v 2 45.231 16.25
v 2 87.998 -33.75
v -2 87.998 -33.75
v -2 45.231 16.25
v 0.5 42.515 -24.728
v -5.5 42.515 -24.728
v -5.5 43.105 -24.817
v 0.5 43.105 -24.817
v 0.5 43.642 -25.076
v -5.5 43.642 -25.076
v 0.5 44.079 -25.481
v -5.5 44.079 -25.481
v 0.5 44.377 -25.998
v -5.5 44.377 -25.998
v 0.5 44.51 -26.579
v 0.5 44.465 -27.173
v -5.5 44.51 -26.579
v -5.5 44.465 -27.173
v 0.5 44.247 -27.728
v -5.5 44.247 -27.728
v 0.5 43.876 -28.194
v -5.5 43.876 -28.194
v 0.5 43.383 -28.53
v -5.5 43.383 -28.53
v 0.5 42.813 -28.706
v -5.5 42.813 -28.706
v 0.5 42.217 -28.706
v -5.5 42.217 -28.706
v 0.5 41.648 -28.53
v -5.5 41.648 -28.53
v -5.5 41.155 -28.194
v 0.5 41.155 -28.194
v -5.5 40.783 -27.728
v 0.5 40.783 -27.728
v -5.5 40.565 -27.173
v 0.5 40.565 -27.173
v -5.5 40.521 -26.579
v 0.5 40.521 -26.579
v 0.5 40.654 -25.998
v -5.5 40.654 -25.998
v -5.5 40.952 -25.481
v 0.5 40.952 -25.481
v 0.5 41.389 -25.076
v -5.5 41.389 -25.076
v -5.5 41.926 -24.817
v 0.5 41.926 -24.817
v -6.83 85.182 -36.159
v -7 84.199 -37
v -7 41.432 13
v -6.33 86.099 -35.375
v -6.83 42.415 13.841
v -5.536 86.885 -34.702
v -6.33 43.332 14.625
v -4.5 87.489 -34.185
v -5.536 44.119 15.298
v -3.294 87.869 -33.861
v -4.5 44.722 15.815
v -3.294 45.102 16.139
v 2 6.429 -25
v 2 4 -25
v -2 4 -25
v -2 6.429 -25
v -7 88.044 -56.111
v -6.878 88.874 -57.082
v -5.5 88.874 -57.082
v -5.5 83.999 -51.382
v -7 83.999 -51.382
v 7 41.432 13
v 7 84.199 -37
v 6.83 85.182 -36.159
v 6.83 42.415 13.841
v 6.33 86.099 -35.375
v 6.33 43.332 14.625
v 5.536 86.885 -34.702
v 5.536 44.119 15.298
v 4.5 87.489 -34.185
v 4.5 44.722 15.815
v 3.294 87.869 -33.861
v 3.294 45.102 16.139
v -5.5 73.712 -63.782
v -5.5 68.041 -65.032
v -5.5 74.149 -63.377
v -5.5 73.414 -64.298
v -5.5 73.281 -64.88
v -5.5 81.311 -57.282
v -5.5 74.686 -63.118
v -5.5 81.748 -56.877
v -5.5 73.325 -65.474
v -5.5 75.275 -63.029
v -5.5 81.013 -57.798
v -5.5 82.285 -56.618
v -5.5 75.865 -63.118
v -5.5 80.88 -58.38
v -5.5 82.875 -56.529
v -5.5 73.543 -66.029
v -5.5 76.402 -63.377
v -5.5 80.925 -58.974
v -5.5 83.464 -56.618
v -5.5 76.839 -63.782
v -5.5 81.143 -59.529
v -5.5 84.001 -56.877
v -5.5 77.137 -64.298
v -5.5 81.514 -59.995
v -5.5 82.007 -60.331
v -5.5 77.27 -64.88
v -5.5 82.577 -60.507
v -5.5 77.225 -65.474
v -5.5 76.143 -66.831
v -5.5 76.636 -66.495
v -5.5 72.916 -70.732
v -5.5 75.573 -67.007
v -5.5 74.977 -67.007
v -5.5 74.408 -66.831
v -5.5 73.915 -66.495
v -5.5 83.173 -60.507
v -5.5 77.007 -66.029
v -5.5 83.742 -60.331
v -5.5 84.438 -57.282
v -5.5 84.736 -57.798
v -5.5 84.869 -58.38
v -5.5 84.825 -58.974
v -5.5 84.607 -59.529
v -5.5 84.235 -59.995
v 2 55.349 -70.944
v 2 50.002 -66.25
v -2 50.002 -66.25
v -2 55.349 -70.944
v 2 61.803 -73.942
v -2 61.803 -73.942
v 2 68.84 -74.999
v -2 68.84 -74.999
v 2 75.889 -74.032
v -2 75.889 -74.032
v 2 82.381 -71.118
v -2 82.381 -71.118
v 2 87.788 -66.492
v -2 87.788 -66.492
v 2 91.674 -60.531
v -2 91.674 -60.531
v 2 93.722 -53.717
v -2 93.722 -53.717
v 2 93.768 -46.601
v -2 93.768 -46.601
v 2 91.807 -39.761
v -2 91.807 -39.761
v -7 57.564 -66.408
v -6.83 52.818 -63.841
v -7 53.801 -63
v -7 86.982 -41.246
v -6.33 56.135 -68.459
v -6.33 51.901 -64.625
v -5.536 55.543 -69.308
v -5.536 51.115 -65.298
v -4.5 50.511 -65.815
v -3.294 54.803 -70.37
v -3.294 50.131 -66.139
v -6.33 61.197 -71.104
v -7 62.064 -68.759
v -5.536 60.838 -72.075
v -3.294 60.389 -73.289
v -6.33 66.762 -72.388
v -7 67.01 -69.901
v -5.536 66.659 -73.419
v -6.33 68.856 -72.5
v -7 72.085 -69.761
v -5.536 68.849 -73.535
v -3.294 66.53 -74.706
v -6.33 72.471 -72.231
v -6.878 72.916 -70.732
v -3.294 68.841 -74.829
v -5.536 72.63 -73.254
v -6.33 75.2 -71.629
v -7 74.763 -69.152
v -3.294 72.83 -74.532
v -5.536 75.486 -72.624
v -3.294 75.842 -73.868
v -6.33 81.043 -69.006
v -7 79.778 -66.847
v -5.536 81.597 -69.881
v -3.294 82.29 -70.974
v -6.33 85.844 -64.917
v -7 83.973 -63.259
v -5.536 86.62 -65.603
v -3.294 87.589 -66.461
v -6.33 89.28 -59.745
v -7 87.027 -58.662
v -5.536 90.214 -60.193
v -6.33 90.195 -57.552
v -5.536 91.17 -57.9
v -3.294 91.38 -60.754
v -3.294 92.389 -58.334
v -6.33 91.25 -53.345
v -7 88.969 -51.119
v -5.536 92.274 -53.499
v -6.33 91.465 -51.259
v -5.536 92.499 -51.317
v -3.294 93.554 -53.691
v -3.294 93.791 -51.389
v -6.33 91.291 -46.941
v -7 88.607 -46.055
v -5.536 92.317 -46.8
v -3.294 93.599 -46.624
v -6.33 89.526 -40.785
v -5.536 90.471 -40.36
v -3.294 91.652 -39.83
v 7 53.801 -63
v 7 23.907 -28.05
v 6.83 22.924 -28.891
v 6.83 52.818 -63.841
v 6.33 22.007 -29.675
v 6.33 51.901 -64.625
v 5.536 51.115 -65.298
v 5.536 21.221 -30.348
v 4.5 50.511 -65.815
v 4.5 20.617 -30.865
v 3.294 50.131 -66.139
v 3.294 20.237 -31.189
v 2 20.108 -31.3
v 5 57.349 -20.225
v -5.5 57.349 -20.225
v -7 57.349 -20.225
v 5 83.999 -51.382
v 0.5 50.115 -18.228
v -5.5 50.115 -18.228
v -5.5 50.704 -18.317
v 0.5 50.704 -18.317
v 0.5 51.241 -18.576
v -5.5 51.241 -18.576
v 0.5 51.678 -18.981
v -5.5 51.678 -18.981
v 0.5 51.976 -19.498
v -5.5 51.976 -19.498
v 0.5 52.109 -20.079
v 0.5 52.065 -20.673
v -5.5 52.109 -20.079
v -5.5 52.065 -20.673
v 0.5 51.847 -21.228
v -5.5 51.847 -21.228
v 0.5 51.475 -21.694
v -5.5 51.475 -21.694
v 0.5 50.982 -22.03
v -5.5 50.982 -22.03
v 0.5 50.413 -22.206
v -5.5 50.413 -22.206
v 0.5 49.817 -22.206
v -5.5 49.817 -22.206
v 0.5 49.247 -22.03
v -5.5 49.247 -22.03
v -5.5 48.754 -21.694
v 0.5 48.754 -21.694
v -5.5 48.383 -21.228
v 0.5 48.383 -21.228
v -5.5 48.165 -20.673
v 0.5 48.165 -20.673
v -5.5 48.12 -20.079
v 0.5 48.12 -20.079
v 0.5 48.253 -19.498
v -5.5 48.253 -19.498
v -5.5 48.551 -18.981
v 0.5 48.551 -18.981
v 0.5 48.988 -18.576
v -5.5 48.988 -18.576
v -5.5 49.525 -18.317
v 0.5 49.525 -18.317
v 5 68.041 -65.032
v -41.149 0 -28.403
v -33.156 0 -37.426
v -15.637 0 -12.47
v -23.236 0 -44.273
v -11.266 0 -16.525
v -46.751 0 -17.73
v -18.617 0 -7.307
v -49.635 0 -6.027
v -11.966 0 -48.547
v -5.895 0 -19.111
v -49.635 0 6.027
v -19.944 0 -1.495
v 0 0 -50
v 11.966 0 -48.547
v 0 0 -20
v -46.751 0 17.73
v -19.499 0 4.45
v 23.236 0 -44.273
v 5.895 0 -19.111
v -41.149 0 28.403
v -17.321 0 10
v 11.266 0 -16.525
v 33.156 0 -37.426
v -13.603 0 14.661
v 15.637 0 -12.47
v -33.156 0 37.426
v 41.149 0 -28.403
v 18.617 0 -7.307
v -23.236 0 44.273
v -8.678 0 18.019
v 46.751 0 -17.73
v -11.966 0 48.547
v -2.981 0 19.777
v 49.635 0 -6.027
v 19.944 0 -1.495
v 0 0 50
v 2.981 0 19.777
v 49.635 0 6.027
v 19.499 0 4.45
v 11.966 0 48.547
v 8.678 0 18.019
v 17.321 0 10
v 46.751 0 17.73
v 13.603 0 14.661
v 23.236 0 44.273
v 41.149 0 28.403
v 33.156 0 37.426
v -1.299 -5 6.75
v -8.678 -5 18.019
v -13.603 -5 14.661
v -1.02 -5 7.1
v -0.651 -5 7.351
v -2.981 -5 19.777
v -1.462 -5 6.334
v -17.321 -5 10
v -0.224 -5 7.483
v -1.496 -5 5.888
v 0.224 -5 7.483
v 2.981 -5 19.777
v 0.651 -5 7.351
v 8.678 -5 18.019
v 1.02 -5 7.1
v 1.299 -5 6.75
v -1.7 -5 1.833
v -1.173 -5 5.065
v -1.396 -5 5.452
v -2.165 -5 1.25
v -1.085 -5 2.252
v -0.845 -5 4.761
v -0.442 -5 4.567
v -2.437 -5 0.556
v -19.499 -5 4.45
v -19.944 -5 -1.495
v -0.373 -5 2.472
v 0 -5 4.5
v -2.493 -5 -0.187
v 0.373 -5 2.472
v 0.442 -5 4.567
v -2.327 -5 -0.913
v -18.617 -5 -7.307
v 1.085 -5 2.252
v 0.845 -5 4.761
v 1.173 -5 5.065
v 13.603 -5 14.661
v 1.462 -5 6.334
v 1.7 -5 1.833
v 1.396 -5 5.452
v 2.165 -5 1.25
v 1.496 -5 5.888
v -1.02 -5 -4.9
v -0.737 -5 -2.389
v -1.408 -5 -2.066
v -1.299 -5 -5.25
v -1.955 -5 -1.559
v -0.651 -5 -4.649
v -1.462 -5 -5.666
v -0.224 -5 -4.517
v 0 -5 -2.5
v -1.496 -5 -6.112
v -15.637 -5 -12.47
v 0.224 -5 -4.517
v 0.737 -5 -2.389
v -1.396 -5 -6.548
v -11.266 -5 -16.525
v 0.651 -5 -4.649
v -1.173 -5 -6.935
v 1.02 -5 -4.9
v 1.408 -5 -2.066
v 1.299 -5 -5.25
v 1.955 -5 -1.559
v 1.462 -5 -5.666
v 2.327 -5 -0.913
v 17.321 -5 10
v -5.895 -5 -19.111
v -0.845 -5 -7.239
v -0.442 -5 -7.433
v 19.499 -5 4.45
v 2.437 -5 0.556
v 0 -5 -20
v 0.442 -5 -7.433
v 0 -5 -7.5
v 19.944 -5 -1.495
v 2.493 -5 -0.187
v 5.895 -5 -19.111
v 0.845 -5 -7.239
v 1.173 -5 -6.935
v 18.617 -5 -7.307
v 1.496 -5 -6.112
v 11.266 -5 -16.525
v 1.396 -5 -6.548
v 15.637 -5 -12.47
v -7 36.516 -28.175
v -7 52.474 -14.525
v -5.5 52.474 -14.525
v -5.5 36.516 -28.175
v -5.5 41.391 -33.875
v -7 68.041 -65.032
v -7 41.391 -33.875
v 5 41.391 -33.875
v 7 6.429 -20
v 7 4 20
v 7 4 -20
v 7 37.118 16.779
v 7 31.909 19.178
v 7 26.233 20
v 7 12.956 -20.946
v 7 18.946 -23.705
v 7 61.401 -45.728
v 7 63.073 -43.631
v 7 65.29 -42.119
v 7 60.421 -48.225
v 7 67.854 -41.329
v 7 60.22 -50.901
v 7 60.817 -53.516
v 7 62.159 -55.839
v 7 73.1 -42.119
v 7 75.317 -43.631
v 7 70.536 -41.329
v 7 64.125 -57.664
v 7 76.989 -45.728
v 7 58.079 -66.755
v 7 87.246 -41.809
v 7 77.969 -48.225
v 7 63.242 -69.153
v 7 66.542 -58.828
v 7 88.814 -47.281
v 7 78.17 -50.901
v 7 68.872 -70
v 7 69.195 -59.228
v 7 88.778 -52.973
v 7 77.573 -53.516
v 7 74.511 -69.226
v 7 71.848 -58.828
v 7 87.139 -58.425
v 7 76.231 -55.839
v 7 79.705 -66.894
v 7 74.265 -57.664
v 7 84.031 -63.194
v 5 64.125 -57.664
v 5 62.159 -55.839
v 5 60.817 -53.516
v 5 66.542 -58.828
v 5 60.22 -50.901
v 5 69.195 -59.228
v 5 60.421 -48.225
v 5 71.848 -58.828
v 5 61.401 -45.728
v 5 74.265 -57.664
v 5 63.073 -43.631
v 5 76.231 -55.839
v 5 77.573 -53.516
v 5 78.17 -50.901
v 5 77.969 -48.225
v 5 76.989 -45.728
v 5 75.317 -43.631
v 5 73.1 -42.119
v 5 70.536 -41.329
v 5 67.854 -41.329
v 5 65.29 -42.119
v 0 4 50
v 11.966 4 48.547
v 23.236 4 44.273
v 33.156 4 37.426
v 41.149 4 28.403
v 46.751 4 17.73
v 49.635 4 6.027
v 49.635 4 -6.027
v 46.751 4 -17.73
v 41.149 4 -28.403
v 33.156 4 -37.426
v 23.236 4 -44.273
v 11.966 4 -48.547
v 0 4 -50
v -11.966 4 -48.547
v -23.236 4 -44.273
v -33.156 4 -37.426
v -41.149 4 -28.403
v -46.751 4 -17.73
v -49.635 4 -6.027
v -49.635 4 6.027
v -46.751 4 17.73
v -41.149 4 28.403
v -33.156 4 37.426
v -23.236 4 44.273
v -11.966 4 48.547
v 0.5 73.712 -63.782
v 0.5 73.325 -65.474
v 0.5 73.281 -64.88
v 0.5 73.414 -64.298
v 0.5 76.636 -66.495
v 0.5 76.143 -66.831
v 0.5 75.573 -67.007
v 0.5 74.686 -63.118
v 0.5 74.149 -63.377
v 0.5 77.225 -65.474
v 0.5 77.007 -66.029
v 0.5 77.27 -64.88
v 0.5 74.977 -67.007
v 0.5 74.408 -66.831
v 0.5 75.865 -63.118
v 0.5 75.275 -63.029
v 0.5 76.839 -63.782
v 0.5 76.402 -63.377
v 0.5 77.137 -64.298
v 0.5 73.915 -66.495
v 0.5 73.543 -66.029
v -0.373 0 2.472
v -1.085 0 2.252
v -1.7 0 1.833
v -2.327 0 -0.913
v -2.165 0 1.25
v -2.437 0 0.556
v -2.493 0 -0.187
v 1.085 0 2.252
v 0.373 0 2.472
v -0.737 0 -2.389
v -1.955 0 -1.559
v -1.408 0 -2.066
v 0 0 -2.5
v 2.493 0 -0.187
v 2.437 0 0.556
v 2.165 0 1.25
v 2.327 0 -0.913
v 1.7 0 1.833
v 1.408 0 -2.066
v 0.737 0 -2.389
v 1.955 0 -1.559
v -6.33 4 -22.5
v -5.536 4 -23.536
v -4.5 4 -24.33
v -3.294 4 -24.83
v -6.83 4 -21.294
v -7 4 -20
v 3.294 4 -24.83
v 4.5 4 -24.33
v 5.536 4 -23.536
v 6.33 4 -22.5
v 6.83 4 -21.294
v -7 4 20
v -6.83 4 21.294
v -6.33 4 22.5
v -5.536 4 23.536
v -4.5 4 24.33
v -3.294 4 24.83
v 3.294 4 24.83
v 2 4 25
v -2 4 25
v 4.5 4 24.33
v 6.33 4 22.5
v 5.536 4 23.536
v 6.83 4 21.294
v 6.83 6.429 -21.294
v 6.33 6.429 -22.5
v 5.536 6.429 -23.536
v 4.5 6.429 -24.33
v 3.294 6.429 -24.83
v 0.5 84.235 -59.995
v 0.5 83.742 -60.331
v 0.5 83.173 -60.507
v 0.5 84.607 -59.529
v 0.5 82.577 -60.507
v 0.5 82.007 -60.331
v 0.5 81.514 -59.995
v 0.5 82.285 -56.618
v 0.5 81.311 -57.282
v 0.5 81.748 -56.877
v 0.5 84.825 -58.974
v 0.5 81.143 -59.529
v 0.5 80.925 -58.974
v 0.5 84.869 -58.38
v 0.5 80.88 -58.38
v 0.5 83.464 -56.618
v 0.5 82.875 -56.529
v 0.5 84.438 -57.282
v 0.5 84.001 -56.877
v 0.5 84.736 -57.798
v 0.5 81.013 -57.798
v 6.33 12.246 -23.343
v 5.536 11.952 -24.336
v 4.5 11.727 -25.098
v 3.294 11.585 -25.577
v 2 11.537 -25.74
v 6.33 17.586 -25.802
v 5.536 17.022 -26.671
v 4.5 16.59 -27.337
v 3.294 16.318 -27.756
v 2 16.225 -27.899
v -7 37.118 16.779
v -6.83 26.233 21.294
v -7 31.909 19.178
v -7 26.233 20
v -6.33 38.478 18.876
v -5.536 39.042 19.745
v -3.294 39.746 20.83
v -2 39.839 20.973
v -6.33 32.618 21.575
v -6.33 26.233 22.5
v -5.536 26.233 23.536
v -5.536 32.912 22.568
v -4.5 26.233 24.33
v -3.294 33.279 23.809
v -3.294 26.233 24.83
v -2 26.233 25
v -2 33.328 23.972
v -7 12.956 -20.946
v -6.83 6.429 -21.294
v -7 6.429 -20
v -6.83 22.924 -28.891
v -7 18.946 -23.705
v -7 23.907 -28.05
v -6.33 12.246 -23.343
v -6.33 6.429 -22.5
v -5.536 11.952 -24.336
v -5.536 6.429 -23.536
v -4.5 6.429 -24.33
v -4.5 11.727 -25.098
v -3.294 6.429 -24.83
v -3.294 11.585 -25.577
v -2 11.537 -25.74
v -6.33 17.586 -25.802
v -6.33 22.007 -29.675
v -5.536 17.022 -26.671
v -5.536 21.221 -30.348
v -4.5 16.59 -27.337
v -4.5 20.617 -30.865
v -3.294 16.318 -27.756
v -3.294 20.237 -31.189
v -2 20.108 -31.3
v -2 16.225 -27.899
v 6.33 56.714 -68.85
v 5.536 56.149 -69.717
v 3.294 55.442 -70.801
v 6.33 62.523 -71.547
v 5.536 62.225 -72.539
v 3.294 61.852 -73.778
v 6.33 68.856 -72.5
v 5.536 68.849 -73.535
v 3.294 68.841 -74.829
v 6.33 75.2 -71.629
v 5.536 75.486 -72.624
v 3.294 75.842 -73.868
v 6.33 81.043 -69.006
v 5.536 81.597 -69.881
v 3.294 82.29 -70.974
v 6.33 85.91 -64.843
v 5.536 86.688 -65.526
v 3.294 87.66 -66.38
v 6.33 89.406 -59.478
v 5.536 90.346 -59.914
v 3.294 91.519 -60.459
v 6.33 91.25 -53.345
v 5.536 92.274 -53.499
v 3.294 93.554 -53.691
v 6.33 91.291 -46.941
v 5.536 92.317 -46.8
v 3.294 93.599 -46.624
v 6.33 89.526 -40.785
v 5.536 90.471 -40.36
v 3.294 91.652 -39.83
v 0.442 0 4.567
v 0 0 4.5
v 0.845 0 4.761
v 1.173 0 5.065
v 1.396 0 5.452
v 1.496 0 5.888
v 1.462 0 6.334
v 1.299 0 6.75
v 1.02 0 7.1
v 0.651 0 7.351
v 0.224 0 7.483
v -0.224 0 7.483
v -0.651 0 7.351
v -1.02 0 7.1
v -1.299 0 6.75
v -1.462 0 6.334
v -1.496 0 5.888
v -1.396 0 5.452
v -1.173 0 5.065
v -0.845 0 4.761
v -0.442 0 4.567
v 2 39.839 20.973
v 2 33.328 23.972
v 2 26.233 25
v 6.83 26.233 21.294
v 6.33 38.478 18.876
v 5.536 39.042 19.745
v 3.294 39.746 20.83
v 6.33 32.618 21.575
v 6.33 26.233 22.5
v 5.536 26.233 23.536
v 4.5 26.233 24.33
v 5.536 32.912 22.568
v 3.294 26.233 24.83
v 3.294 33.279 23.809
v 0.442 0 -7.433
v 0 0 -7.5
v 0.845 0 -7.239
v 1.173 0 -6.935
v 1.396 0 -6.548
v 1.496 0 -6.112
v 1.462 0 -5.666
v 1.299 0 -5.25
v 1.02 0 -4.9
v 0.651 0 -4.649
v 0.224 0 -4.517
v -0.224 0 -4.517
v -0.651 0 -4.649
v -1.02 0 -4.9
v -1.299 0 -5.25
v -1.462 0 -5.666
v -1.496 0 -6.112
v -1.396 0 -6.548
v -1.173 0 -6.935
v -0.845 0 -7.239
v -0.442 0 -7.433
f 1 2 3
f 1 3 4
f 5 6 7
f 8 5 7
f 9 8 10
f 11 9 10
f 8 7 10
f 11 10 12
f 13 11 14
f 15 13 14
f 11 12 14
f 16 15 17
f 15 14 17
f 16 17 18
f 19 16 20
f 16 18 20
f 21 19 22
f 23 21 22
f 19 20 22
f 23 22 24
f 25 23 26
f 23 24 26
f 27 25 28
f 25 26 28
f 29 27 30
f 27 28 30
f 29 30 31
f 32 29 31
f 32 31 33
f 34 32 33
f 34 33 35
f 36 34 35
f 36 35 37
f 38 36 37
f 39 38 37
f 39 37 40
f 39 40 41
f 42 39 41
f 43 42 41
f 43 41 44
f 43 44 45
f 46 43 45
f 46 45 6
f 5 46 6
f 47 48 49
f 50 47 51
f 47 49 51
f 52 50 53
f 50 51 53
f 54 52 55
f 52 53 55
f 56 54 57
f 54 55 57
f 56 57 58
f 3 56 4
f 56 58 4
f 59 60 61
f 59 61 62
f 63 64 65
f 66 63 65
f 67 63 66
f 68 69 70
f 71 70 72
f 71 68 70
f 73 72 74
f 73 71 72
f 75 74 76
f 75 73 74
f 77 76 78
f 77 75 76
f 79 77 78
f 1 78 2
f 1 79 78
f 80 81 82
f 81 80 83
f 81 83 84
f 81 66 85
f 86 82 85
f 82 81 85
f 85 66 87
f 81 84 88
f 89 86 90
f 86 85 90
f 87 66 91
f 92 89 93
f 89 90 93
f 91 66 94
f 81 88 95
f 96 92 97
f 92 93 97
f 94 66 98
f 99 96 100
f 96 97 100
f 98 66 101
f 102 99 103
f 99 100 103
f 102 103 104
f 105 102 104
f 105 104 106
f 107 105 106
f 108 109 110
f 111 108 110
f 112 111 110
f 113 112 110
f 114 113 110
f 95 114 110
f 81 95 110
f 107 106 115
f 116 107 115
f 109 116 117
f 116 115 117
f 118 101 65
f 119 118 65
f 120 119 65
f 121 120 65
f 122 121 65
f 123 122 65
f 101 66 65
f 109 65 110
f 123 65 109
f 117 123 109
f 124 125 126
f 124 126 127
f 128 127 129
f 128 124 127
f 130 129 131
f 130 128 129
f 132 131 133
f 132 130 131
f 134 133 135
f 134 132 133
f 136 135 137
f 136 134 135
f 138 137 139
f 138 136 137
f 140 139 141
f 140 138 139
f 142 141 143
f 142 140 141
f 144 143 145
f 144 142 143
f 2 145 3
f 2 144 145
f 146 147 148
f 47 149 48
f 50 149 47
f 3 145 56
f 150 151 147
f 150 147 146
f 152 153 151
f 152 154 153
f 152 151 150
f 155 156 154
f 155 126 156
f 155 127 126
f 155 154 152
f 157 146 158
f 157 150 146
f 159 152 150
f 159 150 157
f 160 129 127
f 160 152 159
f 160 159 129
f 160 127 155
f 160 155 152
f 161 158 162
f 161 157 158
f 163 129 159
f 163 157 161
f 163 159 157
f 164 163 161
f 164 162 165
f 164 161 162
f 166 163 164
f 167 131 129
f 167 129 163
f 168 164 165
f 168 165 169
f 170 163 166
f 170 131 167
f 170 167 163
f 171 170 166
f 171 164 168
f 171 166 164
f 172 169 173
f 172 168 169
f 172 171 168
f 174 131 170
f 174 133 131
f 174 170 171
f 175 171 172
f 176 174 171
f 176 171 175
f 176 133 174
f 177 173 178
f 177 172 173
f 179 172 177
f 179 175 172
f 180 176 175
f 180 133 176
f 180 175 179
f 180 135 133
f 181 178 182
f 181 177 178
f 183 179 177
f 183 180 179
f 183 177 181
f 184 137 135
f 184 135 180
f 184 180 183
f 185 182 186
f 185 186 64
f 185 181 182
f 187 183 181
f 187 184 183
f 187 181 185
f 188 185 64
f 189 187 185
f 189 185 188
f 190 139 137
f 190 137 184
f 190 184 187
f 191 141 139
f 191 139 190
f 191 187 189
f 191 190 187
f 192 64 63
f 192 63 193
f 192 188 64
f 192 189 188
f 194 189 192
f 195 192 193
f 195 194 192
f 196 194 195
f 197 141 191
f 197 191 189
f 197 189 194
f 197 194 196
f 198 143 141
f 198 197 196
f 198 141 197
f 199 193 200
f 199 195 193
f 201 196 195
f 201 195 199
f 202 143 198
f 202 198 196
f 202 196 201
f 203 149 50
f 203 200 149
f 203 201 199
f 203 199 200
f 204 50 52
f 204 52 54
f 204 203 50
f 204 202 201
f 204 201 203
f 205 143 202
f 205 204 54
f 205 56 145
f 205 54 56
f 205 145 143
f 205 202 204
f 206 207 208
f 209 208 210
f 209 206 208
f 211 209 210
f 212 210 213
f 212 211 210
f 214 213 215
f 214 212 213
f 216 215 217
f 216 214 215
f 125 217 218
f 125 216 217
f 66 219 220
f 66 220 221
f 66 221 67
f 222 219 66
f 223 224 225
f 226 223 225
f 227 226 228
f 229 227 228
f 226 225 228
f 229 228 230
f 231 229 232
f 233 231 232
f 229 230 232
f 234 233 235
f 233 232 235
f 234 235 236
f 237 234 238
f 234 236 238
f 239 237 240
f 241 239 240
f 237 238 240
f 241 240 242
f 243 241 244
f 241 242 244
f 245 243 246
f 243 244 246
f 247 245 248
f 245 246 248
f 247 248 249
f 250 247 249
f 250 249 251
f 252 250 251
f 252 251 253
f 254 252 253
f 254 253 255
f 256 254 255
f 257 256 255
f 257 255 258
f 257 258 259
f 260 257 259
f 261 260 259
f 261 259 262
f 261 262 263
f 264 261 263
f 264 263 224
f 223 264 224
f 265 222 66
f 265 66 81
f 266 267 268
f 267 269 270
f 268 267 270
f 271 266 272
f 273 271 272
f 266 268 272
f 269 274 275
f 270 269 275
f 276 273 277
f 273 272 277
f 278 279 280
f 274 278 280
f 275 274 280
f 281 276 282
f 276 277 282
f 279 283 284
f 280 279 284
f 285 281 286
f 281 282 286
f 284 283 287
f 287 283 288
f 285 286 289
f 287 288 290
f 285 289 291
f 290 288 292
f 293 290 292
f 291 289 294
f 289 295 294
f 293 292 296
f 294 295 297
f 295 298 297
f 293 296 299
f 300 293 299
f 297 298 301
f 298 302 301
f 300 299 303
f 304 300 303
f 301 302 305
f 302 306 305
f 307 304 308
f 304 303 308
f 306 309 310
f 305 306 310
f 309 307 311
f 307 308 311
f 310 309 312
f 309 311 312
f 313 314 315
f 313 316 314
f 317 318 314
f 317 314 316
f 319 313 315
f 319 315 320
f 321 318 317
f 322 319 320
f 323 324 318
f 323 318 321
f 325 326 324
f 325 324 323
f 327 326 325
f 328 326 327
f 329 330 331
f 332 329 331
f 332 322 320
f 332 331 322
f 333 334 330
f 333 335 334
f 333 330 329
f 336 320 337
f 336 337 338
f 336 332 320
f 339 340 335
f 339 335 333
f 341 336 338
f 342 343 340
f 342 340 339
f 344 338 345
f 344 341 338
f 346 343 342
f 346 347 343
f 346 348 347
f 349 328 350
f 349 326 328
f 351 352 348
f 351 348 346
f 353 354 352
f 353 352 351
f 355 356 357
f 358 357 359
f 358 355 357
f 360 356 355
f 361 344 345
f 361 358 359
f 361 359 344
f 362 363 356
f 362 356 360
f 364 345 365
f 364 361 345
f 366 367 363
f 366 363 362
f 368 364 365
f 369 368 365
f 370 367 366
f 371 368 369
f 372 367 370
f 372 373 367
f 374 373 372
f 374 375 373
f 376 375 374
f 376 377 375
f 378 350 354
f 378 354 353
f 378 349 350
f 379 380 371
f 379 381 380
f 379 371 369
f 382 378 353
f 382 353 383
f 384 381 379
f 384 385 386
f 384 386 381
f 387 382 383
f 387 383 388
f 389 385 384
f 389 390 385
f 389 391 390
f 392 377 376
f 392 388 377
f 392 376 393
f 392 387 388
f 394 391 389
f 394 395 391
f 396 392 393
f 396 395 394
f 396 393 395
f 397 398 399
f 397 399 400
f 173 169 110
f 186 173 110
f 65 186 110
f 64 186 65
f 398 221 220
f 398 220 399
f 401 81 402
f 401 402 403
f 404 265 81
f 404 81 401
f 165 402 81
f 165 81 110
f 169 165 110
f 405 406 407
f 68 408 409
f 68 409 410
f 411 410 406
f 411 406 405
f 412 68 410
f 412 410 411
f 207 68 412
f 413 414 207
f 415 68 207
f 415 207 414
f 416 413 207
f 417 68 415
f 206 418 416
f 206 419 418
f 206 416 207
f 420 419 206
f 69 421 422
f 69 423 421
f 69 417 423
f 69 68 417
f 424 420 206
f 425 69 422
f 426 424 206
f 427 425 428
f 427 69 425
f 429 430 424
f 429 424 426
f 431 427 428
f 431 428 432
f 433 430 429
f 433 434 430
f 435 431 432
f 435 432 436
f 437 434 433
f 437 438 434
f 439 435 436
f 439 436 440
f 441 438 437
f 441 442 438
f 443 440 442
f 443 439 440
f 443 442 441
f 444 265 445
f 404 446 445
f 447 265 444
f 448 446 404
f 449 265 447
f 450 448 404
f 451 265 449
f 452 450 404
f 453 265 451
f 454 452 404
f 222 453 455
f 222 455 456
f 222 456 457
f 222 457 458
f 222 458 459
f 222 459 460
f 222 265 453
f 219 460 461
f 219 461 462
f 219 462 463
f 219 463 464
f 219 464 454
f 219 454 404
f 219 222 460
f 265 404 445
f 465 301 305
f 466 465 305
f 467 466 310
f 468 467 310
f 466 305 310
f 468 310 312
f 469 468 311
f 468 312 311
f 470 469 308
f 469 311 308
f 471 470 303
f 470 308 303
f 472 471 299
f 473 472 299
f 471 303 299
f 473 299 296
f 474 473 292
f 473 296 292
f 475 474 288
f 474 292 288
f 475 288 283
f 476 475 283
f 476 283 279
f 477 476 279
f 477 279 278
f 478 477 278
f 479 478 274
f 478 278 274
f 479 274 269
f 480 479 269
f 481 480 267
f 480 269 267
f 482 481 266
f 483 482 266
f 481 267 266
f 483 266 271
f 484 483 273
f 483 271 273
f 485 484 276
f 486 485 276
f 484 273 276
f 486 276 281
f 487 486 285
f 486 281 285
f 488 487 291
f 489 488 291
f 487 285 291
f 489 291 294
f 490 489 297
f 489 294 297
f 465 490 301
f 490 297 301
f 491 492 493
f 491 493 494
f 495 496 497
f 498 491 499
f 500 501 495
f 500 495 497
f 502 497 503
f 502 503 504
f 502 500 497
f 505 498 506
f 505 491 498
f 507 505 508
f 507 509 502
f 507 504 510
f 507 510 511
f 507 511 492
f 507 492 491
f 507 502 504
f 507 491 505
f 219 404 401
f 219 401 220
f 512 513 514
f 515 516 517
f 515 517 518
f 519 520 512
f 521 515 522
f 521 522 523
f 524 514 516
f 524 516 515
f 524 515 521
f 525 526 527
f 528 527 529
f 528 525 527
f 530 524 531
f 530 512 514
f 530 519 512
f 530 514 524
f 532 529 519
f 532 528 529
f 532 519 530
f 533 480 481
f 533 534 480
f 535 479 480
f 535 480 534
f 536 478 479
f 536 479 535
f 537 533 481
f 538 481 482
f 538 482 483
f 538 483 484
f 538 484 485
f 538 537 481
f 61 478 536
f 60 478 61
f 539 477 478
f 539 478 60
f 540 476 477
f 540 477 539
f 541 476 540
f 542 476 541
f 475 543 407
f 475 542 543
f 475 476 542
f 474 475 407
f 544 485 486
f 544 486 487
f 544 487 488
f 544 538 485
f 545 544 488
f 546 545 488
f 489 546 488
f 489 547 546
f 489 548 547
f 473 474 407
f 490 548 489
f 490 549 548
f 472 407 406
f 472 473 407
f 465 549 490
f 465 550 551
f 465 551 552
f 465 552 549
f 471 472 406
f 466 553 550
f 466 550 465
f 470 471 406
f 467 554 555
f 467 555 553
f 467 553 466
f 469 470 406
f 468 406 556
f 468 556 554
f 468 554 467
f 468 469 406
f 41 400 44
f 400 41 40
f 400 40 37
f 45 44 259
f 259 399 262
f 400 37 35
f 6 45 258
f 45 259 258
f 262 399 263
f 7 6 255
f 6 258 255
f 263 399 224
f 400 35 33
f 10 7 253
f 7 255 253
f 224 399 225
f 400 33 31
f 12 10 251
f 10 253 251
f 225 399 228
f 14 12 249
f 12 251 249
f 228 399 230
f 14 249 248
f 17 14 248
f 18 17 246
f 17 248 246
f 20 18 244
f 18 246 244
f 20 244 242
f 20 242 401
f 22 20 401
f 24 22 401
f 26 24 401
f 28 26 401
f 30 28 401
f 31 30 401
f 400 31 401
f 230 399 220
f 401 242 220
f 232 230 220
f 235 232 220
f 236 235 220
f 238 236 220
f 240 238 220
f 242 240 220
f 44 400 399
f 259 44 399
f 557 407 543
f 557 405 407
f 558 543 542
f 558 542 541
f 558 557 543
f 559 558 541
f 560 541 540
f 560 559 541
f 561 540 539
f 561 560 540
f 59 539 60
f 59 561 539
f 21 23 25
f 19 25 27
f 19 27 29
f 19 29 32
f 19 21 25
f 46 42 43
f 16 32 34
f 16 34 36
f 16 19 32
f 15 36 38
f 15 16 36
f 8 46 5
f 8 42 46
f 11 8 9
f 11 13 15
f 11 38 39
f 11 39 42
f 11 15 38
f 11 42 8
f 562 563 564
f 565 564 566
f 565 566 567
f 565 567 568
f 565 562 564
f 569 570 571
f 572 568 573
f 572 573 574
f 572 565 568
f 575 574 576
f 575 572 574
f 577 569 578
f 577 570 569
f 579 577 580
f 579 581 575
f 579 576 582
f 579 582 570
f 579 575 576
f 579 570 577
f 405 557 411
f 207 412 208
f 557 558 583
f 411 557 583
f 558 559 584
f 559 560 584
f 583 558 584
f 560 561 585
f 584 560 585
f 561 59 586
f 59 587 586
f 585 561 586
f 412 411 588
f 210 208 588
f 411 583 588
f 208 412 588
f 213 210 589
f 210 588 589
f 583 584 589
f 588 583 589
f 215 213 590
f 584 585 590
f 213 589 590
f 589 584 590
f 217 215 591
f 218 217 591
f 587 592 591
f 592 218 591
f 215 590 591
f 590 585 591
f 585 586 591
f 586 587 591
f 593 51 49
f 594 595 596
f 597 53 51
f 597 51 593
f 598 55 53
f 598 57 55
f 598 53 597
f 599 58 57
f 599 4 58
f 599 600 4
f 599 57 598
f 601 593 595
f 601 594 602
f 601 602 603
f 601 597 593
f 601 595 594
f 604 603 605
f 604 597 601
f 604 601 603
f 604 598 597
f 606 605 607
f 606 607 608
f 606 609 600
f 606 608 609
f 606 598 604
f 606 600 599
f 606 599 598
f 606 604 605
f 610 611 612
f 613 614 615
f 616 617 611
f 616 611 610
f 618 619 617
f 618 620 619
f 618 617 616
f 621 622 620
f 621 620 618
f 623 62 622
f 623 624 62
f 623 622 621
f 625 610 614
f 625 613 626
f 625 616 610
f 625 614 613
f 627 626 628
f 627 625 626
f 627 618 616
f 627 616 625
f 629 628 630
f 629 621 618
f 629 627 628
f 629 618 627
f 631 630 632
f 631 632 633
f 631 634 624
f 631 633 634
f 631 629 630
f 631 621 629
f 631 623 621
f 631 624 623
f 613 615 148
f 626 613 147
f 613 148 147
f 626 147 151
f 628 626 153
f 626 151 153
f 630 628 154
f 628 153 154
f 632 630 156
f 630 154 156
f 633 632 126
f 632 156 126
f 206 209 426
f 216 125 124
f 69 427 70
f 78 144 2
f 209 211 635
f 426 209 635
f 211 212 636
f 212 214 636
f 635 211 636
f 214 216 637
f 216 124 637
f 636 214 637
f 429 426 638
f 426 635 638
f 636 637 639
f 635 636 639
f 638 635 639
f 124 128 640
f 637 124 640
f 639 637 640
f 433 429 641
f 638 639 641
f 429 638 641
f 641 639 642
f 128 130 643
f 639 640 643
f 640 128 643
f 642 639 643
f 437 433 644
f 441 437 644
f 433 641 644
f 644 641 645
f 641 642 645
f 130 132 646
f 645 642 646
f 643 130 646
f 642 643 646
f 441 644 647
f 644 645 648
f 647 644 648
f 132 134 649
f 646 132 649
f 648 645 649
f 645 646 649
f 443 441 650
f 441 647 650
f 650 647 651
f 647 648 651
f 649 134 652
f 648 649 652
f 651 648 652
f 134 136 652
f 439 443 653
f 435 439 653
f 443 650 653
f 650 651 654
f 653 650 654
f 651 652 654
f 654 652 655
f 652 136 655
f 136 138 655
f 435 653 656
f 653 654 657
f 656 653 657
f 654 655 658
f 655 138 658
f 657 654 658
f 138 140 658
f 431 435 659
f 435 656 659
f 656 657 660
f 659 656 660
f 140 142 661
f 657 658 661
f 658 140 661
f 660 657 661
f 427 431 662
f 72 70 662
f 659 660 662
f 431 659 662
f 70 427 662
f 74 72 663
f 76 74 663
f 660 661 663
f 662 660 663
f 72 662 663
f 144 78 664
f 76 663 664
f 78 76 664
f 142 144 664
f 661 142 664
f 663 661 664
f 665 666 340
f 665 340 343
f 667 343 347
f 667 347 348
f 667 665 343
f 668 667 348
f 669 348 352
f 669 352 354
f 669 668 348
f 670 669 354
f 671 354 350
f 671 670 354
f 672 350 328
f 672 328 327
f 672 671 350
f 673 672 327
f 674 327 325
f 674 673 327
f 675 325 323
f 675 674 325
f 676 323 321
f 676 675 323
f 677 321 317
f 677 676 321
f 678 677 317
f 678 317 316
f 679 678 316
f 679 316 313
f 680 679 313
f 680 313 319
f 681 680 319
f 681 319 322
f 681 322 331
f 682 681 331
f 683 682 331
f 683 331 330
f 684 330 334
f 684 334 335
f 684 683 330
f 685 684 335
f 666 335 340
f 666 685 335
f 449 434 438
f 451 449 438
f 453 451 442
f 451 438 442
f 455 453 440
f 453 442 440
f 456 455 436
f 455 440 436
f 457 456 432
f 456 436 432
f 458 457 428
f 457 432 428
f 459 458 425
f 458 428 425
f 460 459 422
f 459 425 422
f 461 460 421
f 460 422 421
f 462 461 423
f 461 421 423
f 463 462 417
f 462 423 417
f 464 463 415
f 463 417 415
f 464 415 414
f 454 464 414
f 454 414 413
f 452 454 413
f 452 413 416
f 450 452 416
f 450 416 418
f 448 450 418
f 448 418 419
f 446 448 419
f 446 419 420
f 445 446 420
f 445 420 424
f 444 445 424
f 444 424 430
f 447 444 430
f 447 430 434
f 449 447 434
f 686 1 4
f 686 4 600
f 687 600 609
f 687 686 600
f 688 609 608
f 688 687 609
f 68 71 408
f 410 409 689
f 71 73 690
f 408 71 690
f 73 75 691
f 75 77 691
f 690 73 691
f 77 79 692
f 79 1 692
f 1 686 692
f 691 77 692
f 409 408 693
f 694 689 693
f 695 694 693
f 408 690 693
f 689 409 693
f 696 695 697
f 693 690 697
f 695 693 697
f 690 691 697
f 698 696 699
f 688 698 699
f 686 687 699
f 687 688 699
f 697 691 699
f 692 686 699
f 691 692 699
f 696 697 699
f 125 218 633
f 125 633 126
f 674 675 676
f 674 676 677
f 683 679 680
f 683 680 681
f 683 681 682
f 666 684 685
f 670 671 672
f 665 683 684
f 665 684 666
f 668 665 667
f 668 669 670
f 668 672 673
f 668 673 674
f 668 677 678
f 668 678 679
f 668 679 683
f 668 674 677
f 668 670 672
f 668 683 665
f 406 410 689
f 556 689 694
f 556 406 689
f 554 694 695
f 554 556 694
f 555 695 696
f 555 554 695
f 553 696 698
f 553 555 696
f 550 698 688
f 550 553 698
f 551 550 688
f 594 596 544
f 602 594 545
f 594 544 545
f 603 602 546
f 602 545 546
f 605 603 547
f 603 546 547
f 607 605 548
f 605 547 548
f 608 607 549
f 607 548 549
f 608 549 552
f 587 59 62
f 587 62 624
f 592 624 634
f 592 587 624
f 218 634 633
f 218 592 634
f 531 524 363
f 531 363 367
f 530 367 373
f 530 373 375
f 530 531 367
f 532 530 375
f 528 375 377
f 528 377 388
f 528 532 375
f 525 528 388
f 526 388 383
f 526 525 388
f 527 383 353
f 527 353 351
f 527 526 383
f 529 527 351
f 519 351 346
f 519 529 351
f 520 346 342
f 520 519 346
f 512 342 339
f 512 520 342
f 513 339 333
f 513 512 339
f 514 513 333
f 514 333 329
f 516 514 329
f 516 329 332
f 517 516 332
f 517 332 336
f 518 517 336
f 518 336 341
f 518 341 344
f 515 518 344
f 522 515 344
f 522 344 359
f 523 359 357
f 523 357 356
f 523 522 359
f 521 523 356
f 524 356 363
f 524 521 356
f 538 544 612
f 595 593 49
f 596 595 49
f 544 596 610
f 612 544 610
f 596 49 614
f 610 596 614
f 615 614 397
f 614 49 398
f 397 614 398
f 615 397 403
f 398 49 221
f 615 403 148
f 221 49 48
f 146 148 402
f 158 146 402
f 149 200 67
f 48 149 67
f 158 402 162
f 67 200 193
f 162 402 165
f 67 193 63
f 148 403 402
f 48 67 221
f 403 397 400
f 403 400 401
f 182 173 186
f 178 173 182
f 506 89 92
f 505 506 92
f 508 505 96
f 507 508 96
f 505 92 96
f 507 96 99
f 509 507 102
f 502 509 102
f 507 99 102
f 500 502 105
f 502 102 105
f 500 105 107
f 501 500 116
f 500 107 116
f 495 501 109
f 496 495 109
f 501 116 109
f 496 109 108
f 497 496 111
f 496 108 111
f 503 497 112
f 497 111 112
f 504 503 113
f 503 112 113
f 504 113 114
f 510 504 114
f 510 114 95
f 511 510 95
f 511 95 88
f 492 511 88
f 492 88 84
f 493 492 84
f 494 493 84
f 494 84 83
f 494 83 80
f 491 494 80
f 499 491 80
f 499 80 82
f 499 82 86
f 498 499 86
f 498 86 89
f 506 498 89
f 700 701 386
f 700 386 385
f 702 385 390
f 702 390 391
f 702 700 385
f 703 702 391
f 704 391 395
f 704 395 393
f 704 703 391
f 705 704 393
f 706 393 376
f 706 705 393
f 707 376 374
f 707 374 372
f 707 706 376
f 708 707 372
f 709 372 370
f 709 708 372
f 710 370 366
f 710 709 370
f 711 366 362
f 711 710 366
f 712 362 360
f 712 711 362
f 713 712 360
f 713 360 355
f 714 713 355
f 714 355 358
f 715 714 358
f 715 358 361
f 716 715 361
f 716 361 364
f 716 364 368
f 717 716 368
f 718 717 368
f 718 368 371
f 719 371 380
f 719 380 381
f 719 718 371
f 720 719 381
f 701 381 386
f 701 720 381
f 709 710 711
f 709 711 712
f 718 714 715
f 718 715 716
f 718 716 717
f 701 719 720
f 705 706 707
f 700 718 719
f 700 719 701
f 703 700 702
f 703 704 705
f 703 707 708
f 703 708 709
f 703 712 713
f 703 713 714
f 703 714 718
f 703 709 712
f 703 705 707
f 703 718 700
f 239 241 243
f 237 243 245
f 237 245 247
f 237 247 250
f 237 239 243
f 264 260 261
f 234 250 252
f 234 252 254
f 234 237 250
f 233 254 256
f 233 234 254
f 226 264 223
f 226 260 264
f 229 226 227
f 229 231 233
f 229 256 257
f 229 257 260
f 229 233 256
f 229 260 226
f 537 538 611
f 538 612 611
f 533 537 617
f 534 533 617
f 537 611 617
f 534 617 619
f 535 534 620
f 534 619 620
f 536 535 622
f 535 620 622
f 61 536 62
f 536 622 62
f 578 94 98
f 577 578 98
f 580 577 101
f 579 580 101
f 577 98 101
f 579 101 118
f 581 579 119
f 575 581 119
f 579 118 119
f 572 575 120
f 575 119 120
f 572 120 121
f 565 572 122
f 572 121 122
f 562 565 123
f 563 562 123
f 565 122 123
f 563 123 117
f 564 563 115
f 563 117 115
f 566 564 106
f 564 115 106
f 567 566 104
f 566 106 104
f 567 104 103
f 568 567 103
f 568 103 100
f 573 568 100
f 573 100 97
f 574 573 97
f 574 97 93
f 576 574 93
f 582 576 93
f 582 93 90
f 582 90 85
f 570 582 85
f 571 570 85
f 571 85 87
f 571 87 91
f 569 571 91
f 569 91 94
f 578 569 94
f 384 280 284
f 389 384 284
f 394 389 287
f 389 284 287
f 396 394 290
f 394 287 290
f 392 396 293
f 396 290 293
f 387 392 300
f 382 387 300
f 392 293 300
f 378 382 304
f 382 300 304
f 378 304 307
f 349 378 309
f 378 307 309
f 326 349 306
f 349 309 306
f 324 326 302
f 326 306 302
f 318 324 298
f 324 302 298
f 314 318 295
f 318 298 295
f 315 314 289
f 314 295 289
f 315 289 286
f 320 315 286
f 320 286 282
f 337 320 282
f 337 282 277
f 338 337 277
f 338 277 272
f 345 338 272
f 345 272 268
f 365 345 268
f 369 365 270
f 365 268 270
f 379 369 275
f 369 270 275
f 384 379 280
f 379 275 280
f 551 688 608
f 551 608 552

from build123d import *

# Parameters (mm, degrees)
SKETCH2_R            = 50
BOSS_EXTRUDE1_DEPTH  = 4
BOSS_EXTRUDE2_DEPTH  = 14
CUT_EXTRUDE5_REACH   = 134.235
SKETCH30_R           = 20
BOSS_EXTRUDE12_DEPTH = 5
SKETCH5_R            = 2.5
CUT_EXTRUDE18_DEPTH  = 5
SKETCH4_R            = 1.5
CUT_EXTRUDE19_DEPTH  = 5
SKETCH9_R            = 2
CUT_EXTRUDE6_DEPTH   = 7.5
FILLET7_R            = 5
CUT_EXTRUDE20_DEPTH  = 1.5
SKETCH32_R           = 9
CUT_EXTRUDE21_DEPTH  = 10


with BuildPart() as part:
    # Sketch2 → Boss-Extrude1 (new body)
    with BuildSketch(Plane(origin=(0, 0, 0), x_dir=(1, 0, 0), z_dir=(0, 1, 0))):
        with Locations(Location((0, 0, 0), (0, 0, 270))):
            Circle(SKETCH2_R)
    extrude(amount=BOSS_EXTRUDE1_DEPTH)

    # Sketch7 → Boss-Extrude2 (add)
    with BuildSketch(Plane(origin=(7, 0, 0), x_dir=(0, 0, -1), z_dir=(1, 0, 0))):
        with BuildLine():
            Line((25, 4), (25, 6.428793809))
            ThreePointArc((25, 6.428793809), (26.650688088, 13.958734048), (31.3, 20.107609548))
            Line((31.3, 20.107609548), (66.25, 50.001644808))
            ThreePointArc((66.25, 50.001644808), (68.998355192, 85.25), (33.75, 87.998355192))
            Line((33.75, 87.998355192), (-16.25, 45.23149502))
            ThreePointArc((-16.25, 45.23149502), (-22.707377656, 36.691390159), (-25, 26.233139828))
            Line((-25, 26.233139828), (-25, 4))
            Line((-25, 4), (25, 4))
        make_face()
    extrude(amount=-BOSS_EXTRUDE2_DEPTH)

    # Sketch8 → Cut-Extrude5 (cut, up to next)
    with BuildSketch(Plane(origin=(5, 0, 0), x_dir=(0, 0, -1), z_dir=(1, 0, 0)), mode=Mode.PRIVATE) as cut_extrude5_sk1:
        Polygon((20.224986928, 57.349309181), (51.382289443, 83.999309181), (65.032289443, 68.040690819), (33.874986928, 41.390690819), align=None)
    cut_extrude5_tool1 = extrude(cut_extrude5_sk1.sketch, amount=-CUT_EXTRUDE5_REACH, mode=Mode.PRIVATE) & part.part
    add(cut_extrude5_tool1.solids().sort_by_distance((5, 62.695, -42.628638))[0], mode=Mode.SUBTRACT)

    # Sketch30 → Boss-Extrude12 (add)
    with BuildSketch(Plane.XZ):
        with Locations(Location((0, 0, 0), (0, 0, 270))):
            Circle(SKETCH30_R)
    extrude(amount=BOSS_EXTRUDE12_DEPTH)

    # Sketch5 → Cut-Extrude18 (cut)
    with BuildSketch(Plane.XZ):
        with Locations(Location((0, 0, 0), (0, 0, 270))):
            Circle(SKETCH5_R)
    extrude(amount=CUT_EXTRUDE18_DEPTH, mode=Mode.SUBTRACT)

    # Sketch4 → Cut-Extrude19 (cut)
    with BuildSketch(Plane.XZ):
        with Locations(Location((0, 6, 0), (0, 0, 270))):
            Circle(SKETCH4_R)
        with Locations(Location((0, -6, 0), (0, 0, 270))):
            Circle(SKETCH4_R)
    extrude(amount=CUT_EXTRUDE19_DEPTH, mode=Mode.SUBTRACT)

    # Sketch9 → Cut-Extrude6 (cut)
    with BuildSketch(Plane.ZY.offset(7)):
        with Locations((-65.028980219, 75.275328962)):
            Circle(SKETCH9_R)
        with Locations((-20.228296152, 50.114671038)):
            Circle(SKETCH9_R)
        with Locations((-26.728296152, 42.515328962)):
            Circle(SKETCH9_R)
        with Locations((-58.528980219, 82.874671038)):
            Circle(SKETCH9_R)
    extrude(amount=-CUT_EXTRUDE6_DEPTH, mode=Mode.SUBTRACT)

    # Fillet7
    fillet7_edges = [part.edges().sort_by_distance(p)[0] for p in [
        (-7, 35.054627178, -48.775),
        (7, 85.25, -68.998355192),
        (7, 66.614925106, -8.75),
        (-7, 85.25, -68.998355192),
        (-7, 13.958734048, -26.650688088),
        (-7, 5.214396905, -25),
        (-7, 15.116569914, 25),
        (-7, 66.614925106, -8.75),
        (-7, 36.691390159, 22.707377656),
        (7, 36.691390159, 22.707377656),
        (7, 35.054627178, -48.775),
        (7, 15.116569914, 25),
        (7, 5.214396905, -25),
        (7, 13.958734048, -26.650688088),
    ]]
    fillet(fillet7_edges, radius=FILLET7_R)

    # Sketch31 → Cut-Extrude20 (cut)
    with BuildSketch(Plane.ZY.offset(7)):
        Polygon((-14.525480371, 52.474309181), (-28.175480371, 36.515690819), (-70.731796001, 72.915690819), (-57.081796001, 88.874309181), align=None)
    extrude(amount=-CUT_EXTRUDE20_DEPTH, mode=Mode.SUBTRACT)

    # Sketch32 → Cut-Extrude21 (cut)
    with BuildSketch(Plane(origin=(7, 0, 0), x_dir=(0, 0, -1), z_dir=(1, 0, 0))):
        with Locations((50.227980262, 69.195)):
            Circle(SKETCH32_R)
    extrude(amount=-CUT_EXTRUDE21_DEPTH, mode=Mode.SUBTRACT)


solid = part.part
